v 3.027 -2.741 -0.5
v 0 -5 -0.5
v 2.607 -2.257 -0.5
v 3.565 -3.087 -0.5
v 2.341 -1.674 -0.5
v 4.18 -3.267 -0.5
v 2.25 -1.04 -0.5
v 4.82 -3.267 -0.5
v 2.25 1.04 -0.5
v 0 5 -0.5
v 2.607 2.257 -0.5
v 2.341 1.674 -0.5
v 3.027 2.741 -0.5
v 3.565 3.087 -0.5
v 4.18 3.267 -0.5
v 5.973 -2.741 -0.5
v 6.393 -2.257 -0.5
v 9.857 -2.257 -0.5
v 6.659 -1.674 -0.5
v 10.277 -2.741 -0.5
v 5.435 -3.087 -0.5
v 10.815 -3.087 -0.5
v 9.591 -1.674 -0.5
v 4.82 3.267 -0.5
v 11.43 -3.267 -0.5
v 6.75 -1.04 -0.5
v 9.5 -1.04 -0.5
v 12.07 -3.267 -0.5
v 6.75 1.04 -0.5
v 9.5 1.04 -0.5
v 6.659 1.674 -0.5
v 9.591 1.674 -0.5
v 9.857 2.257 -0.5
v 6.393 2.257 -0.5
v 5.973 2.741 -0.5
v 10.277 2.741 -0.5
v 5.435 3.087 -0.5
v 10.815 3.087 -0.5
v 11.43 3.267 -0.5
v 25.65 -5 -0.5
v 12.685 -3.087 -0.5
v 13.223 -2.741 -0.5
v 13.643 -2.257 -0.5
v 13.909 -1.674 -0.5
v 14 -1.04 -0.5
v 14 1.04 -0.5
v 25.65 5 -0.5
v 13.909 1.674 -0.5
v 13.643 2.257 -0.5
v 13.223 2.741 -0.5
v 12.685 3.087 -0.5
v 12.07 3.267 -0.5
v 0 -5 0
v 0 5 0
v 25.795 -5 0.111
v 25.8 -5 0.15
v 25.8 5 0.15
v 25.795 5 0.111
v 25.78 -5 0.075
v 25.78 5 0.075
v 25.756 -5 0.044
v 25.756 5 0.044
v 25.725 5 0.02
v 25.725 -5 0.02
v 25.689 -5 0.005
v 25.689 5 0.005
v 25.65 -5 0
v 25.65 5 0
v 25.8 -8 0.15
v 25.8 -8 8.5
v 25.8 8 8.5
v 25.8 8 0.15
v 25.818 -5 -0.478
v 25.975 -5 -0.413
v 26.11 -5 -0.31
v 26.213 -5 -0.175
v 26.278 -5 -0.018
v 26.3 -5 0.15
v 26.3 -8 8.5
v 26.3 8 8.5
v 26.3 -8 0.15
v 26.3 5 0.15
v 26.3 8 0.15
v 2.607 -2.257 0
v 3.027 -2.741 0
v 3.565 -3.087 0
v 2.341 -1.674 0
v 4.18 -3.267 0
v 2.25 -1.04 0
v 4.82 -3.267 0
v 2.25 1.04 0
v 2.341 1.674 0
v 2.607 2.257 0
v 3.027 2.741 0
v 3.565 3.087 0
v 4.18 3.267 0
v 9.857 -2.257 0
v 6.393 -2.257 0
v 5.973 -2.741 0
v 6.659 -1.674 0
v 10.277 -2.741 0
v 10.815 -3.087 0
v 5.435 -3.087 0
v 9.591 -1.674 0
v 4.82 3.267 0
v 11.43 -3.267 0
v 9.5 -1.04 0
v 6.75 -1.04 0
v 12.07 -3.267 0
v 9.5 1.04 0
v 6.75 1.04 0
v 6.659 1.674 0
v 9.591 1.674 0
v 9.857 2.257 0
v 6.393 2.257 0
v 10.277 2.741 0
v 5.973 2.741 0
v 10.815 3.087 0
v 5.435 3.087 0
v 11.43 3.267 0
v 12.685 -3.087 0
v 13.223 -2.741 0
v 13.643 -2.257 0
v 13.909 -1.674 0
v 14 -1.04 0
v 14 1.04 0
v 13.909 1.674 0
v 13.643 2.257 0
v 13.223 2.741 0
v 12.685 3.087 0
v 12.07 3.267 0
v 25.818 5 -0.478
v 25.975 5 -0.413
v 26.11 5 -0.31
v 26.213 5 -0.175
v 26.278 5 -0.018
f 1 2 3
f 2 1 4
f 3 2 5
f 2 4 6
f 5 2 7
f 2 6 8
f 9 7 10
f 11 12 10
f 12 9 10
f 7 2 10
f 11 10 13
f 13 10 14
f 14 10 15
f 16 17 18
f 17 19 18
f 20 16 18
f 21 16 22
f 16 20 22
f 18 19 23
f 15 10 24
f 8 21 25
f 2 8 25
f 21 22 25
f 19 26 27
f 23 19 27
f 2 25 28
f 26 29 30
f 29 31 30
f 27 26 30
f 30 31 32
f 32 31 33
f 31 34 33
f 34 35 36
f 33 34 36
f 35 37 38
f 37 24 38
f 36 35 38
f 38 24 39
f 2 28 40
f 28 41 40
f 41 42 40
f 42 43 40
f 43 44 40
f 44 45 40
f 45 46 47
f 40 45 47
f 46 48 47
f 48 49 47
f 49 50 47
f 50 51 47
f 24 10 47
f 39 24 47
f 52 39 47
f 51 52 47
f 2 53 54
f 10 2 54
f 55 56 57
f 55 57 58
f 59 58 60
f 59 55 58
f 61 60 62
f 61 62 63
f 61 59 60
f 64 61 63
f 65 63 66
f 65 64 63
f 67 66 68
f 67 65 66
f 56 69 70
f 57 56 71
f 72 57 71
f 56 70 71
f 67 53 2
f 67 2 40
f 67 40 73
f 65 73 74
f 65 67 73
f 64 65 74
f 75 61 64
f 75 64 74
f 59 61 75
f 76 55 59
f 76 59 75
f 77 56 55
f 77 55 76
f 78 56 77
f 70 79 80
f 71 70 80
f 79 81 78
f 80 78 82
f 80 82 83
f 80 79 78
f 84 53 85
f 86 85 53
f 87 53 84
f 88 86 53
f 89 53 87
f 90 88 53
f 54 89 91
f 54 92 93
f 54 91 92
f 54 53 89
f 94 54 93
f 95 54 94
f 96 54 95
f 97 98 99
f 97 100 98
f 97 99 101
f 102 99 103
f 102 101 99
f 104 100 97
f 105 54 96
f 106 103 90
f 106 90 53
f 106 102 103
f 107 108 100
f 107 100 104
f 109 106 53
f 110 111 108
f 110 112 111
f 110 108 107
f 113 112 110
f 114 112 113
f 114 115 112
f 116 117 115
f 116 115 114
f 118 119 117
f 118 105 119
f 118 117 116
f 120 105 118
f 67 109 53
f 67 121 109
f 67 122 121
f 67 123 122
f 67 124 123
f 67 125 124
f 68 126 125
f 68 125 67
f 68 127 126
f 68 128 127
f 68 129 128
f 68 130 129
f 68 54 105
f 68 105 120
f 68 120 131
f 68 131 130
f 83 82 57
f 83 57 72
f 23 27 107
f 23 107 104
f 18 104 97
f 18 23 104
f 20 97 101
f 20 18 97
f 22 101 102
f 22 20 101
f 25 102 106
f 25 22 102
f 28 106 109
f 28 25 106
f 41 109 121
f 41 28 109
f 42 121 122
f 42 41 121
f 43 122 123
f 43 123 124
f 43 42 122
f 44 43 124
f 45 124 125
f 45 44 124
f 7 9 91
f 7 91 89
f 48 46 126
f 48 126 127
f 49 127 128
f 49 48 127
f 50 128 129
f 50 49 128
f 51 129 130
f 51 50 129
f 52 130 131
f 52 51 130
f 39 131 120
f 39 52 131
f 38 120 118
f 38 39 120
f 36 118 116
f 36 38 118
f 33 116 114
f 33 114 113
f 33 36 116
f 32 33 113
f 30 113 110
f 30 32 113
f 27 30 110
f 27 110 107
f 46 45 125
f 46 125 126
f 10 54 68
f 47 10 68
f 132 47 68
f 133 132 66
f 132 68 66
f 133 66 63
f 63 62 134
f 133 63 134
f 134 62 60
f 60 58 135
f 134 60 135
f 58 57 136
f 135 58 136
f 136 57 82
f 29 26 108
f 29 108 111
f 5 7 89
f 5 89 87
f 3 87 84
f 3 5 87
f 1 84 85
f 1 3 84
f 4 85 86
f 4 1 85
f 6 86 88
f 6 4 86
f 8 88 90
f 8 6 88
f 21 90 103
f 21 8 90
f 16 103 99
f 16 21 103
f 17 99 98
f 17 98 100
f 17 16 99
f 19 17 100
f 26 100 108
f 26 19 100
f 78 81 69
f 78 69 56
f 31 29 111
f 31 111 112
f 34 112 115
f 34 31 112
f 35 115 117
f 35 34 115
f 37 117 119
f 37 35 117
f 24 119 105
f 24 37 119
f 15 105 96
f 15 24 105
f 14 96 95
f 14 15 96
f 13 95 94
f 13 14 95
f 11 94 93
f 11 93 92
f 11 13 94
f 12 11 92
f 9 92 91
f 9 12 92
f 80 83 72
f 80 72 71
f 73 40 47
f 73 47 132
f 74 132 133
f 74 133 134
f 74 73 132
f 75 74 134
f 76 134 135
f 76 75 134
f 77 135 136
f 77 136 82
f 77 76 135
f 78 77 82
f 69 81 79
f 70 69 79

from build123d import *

# Parameters (mm, degrees)
SKETCH1_W                    = 26.3
SKETCH1_H                    = 10
BASE_FLANGE1_DEPTH           = 0.5
EDGE_FLANGE1_STRIP_W         = 2.3
EDGE_FLANGE1_STRIP_H         = 0.5
EDGE_FLANGE1_STRIP_CUT_DEPTH = 10
EDGE_FLANGE1_DEPTH           = 10
EDGE_FLANGE1_PROFILE_W       = 16
EDGE_FLANGE1_PROFILE_H       = 8.35
EDGE_FLANGE1_FLAT_DEPTH      = 0.5
M4_START                     = -0.5
M4_CLEARANCE_SLOT1_DEPTH     = 0.5


# Read off the part's stored shape, not the designer's step: M4 Clearance Slot1
# Sheet-metal steps are written as plain solids
with BuildPart() as part:
    # Sketch1 → Base-Flange1 (new body)
    with BuildSketch(Plane.XY):
        with Locations((13.15, 0)):
            Rectangle(SKETCH1_W, SKETCH1_H)
    extrude(amount=-BASE_FLANGE1_DEPTH)

    # Edge-Flange1 strip (across the edge) → Edge-Flange1 strip cut (cut)
    with BuildSketch(Plane(origin=(26.3, -5, 0), x_dir=(-1, 0, 0), z_dir=(0, 1, 0))):
        with Locations((-0.5, -0.25)):
            Rectangle(EDGE_FLANGE1_STRIP_W, EDGE_FLANGE1_STRIP_H)
    extrude(amount=EDGE_FLANGE1_STRIP_CUT_DEPTH, mode=Mode.SUBTRACT)

    # Edge-Flange1 bend section (across the edge) → Edge-Flange1 (add)
    with BuildSketch(Plane(origin=(26.3, -5, 0), x_dir=(-1, 0, 0), z_dir=(0, 1, 0))):
        with BuildLine():
            Line((0, 0.15), (0.5, 0.15))
            ThreePointArc((0.5, 0.15), (0.543933983, 0.043933983), (0.65, 0))
            Line((0.65, 0), (0.65, -0.5))
            ThreePointArc((0.65, -0.5), (0.190380592, -0.309619408), (0, 0.15))
        make_face()
    extrude(amount=EDGE_FLANGE1_DEPTH)

    # Edge-Flange1 profile (on flange) → Edge-Flange1 flat (add)
    with BuildSketch(Plane.YZ.offset(26.3)):
        with Locations((0, 4.325)):
            Rectangle(EDGE_FLANGE1_PROFILE_W, EDGE_FLANGE1_PROFILE_H)
    extrude(amount=-EDGE_FLANGE1_FLAT_DEPTH)

    # M4 Clearance Slot1 outline → M4 Clearance Slot1 (cut)
    with BuildSketch(Plane.XY.offset(M4_START)):
        with BuildLine():
            Line((14, -1.040099885), (14, 1.040099885))
            ThreePointArc((14, 1.040099885), (11.75, 3.290099885), (9.5, 1.040099885))
            Line((9.5, 1.040099885), (9.5, -1.040099885))
            ThreePointArc((9.5, -1.040099885), (11.75, -3.290099885), (14, -1.040099885))
        make_face()
        with BuildLine():
            Line((6.75, -1.040099885), (6.75, 1.040099885))
            ThreePointArc((6.75, 1.040099885), (4.5, 3.290099885), (2.25, 1.040099885))
            Line((2.25, 1.040099885), (2.25, -1.040099885))
            ThreePointArc((2.25, -1.040099885), (4.5, -3.290099885), (6.75, -1.040099885))
        make_face()
    extrude(amount=M4_CLEARANCE_SLOT1_DEPTH, mode=Mode.SUBTRACT)


solid = part.part
